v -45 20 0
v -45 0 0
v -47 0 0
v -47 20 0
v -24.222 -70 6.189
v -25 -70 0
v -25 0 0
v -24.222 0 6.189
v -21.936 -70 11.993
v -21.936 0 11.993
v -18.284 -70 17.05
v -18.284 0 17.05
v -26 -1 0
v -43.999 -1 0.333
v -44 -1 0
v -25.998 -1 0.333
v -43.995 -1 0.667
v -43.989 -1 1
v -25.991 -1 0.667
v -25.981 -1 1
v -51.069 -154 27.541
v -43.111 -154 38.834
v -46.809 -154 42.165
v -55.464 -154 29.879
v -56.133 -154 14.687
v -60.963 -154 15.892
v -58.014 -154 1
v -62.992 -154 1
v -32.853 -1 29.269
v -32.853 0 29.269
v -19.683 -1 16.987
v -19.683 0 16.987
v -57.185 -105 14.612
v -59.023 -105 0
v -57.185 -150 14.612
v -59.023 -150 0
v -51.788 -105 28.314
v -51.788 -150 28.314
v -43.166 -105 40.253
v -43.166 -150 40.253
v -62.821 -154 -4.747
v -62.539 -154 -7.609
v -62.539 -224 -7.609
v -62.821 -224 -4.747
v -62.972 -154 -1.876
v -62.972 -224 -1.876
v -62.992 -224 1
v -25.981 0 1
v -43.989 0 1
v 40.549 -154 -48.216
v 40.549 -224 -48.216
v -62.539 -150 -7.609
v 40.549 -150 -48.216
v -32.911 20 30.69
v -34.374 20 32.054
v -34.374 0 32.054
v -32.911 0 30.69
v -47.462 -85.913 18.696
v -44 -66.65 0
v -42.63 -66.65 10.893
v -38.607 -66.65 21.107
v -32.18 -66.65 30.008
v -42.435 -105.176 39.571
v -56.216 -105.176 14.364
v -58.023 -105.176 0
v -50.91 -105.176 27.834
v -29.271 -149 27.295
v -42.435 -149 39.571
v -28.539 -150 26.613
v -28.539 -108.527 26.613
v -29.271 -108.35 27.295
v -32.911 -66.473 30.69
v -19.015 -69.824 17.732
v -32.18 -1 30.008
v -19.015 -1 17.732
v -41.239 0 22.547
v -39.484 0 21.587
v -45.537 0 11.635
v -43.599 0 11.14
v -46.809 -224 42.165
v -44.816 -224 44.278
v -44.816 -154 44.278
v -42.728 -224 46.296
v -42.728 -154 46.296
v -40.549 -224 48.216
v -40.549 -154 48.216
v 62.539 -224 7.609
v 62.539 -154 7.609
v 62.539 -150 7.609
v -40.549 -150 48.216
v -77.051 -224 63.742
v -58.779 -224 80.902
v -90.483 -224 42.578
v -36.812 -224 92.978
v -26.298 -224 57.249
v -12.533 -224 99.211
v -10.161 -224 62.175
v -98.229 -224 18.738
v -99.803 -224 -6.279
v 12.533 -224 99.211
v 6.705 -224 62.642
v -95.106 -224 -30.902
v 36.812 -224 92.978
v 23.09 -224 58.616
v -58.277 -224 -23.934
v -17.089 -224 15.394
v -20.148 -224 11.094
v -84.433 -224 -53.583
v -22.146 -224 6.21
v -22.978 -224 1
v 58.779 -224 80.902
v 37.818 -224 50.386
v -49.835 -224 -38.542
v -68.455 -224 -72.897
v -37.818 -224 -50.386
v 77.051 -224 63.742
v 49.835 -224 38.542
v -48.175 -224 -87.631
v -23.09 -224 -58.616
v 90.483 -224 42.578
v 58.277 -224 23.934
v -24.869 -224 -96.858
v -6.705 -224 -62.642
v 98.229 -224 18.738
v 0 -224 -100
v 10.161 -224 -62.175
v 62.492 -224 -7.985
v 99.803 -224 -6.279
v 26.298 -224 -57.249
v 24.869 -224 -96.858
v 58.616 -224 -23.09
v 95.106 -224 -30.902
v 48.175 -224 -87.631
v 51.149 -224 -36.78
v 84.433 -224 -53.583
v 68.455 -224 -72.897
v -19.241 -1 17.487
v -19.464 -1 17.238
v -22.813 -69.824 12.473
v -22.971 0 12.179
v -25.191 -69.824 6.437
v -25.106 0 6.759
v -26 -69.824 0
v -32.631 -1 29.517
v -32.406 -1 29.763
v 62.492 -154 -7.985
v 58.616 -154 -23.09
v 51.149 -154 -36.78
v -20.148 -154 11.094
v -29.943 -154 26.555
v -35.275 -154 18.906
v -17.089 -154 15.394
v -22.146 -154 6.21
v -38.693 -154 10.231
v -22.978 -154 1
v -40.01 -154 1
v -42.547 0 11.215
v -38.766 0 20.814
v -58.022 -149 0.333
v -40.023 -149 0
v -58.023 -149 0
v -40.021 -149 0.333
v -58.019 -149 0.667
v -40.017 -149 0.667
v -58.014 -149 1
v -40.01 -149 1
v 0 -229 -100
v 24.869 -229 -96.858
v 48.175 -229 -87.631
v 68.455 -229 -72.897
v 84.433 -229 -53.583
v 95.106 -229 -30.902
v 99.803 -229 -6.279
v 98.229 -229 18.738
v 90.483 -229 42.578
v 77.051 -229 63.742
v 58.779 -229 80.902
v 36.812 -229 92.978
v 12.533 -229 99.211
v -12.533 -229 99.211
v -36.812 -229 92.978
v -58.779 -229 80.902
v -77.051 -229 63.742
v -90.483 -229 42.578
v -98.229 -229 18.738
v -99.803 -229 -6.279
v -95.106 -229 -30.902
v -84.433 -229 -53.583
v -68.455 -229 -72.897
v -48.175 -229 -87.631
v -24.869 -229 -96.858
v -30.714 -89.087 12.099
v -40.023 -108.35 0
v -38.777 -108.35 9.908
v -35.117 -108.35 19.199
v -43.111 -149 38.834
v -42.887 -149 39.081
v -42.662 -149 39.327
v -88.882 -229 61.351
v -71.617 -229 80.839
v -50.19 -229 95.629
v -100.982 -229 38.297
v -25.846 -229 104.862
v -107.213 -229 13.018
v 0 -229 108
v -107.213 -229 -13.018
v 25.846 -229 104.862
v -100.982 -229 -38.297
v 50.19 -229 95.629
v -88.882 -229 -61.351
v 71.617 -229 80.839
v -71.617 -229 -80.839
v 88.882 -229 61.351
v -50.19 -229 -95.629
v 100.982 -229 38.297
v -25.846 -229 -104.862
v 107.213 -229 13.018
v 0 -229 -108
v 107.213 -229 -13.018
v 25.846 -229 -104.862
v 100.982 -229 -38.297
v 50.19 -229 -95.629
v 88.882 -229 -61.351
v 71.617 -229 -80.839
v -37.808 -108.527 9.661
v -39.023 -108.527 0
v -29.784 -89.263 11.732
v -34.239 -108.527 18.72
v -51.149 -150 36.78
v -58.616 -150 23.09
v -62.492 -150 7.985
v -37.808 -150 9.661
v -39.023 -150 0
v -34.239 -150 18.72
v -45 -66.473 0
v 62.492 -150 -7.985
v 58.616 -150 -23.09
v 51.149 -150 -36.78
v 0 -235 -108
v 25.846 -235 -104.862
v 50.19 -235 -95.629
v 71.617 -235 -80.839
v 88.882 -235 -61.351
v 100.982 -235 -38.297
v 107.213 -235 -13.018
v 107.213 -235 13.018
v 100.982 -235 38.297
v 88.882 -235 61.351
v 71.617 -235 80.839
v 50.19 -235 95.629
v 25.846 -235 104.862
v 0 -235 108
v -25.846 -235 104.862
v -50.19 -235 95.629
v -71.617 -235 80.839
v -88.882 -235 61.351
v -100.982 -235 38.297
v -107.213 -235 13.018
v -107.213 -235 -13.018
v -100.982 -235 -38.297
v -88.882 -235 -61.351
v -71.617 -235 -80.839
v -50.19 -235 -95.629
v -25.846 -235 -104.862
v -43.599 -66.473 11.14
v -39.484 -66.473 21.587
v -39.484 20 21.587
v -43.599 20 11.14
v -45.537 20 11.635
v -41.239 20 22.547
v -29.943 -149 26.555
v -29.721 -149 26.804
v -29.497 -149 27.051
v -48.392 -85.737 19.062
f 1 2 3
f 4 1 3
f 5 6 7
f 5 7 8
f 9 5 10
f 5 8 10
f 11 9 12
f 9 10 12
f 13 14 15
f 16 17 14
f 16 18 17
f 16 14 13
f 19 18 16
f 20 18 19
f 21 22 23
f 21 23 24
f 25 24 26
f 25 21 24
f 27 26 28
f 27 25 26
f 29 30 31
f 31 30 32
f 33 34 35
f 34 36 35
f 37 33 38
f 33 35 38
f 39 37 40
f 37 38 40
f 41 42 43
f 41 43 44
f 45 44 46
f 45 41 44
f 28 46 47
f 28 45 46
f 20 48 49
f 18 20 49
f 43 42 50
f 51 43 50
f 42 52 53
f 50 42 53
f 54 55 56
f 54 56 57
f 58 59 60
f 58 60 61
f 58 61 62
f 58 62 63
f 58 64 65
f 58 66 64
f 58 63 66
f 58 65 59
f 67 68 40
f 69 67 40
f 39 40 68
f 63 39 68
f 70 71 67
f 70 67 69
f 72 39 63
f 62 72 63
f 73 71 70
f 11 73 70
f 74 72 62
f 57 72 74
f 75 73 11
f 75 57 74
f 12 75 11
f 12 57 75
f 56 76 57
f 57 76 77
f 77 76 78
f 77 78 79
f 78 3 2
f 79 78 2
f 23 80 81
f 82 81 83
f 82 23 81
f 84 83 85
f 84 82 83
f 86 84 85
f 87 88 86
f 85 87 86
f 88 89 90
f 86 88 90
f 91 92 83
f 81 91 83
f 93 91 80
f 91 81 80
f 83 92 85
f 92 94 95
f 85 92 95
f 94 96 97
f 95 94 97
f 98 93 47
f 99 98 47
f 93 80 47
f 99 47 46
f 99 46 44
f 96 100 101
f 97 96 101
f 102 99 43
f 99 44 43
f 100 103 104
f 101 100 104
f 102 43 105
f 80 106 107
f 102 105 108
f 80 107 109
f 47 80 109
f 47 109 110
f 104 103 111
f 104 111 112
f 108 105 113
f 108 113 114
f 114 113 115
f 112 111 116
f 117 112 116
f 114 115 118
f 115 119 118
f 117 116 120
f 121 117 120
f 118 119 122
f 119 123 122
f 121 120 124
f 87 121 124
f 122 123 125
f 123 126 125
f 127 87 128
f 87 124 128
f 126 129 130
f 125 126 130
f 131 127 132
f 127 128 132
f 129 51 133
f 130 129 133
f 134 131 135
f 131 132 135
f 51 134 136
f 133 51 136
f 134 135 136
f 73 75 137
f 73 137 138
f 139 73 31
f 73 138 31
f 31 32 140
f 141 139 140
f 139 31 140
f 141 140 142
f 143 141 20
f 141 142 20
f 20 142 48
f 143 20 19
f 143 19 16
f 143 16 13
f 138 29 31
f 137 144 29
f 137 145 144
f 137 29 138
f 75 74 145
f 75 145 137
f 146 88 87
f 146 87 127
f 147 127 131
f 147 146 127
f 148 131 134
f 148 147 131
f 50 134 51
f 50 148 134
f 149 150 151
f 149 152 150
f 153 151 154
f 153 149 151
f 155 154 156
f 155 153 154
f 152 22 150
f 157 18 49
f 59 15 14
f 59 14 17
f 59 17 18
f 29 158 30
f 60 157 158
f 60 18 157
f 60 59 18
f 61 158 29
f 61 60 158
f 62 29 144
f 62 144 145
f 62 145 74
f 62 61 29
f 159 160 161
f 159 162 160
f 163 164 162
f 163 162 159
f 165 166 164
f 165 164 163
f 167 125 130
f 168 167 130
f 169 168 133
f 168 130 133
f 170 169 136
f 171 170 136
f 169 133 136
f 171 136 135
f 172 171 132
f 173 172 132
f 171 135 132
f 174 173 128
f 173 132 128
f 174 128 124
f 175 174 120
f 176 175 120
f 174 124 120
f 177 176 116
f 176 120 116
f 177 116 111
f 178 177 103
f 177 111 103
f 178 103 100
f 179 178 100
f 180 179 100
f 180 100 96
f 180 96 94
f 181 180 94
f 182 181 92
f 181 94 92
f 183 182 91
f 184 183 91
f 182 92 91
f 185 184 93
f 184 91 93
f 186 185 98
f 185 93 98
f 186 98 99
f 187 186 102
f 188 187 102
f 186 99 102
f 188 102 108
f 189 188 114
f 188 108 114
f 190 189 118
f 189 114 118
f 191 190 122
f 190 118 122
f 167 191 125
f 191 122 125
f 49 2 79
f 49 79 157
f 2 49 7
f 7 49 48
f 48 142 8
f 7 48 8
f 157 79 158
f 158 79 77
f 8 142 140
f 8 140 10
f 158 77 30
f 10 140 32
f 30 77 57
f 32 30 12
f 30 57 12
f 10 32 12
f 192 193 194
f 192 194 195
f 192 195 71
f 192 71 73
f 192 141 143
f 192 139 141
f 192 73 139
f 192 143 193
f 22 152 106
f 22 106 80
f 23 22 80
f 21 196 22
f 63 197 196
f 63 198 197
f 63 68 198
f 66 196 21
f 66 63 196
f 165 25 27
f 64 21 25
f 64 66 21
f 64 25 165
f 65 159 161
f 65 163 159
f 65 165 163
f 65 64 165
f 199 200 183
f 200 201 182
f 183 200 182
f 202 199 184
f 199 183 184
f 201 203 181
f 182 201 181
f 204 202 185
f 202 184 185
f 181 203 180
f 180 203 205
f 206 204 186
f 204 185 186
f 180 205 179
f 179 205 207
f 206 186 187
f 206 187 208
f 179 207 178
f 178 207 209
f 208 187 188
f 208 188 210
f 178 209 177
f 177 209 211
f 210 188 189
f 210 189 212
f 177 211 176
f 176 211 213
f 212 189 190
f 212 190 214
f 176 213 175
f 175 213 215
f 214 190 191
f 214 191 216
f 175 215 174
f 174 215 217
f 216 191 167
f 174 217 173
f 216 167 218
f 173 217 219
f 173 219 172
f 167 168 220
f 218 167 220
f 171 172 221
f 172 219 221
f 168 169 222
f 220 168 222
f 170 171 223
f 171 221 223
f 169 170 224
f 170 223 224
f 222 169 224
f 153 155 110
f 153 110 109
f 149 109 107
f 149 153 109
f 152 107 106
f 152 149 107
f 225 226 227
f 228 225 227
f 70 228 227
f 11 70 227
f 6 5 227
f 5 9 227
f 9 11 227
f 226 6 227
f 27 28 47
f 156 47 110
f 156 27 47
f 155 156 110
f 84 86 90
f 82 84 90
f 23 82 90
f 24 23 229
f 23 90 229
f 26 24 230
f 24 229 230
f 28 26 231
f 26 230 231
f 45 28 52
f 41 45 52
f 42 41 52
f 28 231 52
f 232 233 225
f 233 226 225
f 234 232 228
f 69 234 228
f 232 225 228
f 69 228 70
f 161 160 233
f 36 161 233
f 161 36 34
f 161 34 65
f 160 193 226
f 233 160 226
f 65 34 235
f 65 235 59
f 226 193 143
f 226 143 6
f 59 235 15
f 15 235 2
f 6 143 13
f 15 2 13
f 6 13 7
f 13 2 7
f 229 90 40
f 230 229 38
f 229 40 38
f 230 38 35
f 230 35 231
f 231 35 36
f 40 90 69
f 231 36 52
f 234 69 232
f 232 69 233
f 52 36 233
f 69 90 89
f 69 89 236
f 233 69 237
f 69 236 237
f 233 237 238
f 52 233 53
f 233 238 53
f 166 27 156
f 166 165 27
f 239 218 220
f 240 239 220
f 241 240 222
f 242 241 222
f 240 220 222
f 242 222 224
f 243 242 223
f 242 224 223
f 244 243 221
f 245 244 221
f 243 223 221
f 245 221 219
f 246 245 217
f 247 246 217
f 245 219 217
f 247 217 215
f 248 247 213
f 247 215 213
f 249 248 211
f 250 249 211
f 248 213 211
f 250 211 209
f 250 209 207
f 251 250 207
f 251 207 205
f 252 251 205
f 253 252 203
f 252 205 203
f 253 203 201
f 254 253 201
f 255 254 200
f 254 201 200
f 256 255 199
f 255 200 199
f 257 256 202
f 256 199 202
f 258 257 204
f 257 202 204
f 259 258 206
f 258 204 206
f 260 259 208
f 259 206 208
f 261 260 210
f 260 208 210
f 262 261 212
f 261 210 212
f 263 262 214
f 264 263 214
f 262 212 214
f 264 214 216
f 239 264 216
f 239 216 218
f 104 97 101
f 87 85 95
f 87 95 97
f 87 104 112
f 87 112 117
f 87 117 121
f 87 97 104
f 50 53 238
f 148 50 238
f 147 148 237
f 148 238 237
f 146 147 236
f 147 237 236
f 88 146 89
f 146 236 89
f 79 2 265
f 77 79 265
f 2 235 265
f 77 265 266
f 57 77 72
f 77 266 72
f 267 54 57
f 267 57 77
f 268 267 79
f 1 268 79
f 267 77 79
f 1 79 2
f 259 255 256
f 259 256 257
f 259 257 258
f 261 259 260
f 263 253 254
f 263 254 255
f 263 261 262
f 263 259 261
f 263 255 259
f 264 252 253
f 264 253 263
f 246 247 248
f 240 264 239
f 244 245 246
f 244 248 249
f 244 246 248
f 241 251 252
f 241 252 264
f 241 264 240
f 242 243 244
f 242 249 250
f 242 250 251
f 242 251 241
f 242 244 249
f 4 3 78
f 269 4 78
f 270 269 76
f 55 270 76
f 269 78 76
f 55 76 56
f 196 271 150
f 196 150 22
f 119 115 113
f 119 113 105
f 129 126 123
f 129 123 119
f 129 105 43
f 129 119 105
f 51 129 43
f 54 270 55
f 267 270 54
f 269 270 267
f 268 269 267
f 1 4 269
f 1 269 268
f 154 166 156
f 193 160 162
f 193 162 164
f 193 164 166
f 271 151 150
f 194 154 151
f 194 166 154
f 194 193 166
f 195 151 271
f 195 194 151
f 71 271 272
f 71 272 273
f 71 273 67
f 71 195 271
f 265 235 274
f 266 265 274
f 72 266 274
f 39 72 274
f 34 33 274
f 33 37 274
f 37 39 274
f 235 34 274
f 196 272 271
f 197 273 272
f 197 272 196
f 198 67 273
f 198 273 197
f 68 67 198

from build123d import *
from build123d.topology import SkipClean

# Parameters (mm, degrees)
REVOLVE2_ANGLE      = 43
CUT_EXTRUDE3_DEPTH  = 3
CUT_EXTRUDE4_DEPTH  = 7
BOSS_EXTRUDE1_DEPTH = 20
SKETCH6_R           = 63
BOSS_EXTRUDE2_DEPTH = 4
CUT_EXTRUDE5_DEPTH  = 4
BOSS_EXTRUDE3_DEPTH = 70
SKETCH10_R          = 100
BOSS_EXTRUDE4_DEPTH = 5
SKETCH11_R          = 108
BOSS_EXTRUDE6_DEPTH = 6
CUT_EXTRUDE6_DEPTH  = 74


with BuildPart() as part:
    # Sketch1 → Revolve2 (revolve)
    with BuildSketch(Plane.XY):
        Polygon((-25, 0), (-45, 0), (-45, -66.473460386), (-59.022513649, -105), (-59.022513649, -150), (-39.022513649, -150), (-39.022513649, -108.526539614), (-25, -70), align=None)
        Polygon((-44, -1), (-44, -66.649787367), (-58.022513649, -105.176326981), (-58.022513649, -149), (-40.022513649, -149), (-40.022513649, -108.350212633), (-26, -69.823673019), (-26, -1), align=None, mode=Mode.SUBTRACT)
    revolve(axis=Axis((0, 0, 0), (0, 1, 0)), revolution_arc=REVOLVE2_ANGLE)

    # 3DSketch2 → Cut-Extrude3 (cut)
    with BuildSketch(Plane(origin=(-25.980762114, 0, 1), x_dir=(-0.23623107763582377, 0, 0.9716969064265963), z_dir=(0, 1, 0))):
        with BuildLine():
            Line((0, 0), (4.254019193, -17.498194274))
            ThreePointArc((4.254019193, -17.498194274), (18.231392391, -10.961020186), (29.092223071, 0))
            Line((29.092223071, 0), (14.047290588, 9.89613504))
            ThreePointArc((14.047290588, 9.89613504), (7.864802638, 3.754067883), (0, 0))
        make_face()
    extrude(amount=-CUT_EXTRUDE3_DEPTH, mode=Mode.SUBTRACT)

    # 3DSketch3 → Cut-Extrude4 (cut)
    with BuildSketch(Plane(origin=(-58.013895664, -150, 1), x_dir=(0.9998514717105971, 0, -0.017234689383714308), z_dir=(0, -1, 0))):
        with BuildLine():
            Line((0, 0), (18.001202849, 0.310291227))
            ThreePointArc((18.001202849, 0.310291227), (20.537591079, 14.024342363), (27.625813139, 26.035402761))
            Line((27.625813139, 26.035402761), (14.248948694, 38.085260946))
            ThreePointArc((14.248948694, 38.085260946), (3.678864709, 20.33174636), (0, 0))
        make_face()
    extrude(amount=-CUT_EXTRUDE4_DEPTH, mode=Mode.SUBTRACT)

    # Sketch6 → Boss-Extrude2 (add)
    with BuildSketch(Plane.XZ.offset(150)):
        with Locations(Location((0, 0, 0), (0, 0, 270))):
            Circle(SKETCH6_R)
    extrude(amount=BOSS_EXTRUDE2_DEPTH)

    # 3DSketch3<2> → Cut-Extrude5 (cut)
    with BuildSketch(Plane(origin=(-58.013895664, -150, 1), x_dir=(0.9998514717105971, 0, -0.017234689383714308), z_dir=(0, -1, 0))):
        with BuildLine():
            Line((0, 0), (18.001202849, 0.310291227))
            ThreePointArc((18.001202849, 0.310291227), (20.537591079, 14.024342363), (27.625813139, 26.035402761))
            Line((27.625813139, 26.035402761), (14.248948694, 38.085260946))
            ThreePointArc((14.248948694, 38.085260946), (3.678864709, 20.33174636), (0, 0))
        make_face()
    extrude(amount=CUT_EXTRUDE5_DEPTH, mode=Mode.SUBTRACT)

    # Sketch7 → Boss-Extrude3 (add)
    with SkipClean():  # the faces are left unmerged after this step: merging them gives an invalid solid
        with BuildSketch(Plane(origin=(0, -154, 0), x_dir=(-1, 0, 0), z_dir=(0, -1, 0))):
            with BuildLine():
                Line((17.08897941, -15.393725433), (46.808943602, -42.165421839))
                ThreePointArc((46.808943602, -42.165421839), (-58.632015581, 23.049658325), (62.992062992, -1))
                Line((62.992062992, -1), (22.978250586, -1))
                ThreePointArc((22.978250586, -1), (21.287098507, -8.709732323), (17.08897941, -15.393725433))
            make_face()
        extrude(amount=BOSS_EXTRUDE3_DEPTH)

    # Sketch10 → Boss-Extrude4 (add)
    with SkipClean():  # the faces are left unmerged after this step: merging them gives an invalid solid
        with BuildSketch(Plane(origin=(0, -224, 0), x_dir=(-1, 0, 0), z_dir=(0, -1, 0))):
            with Locations(Location((0, 0, 0), (0, 0, 90))):
                Circle(SKETCH10_R)
        extrude(amount=BOSS_EXTRUDE4_DEPTH)

    # Sketch11 → Boss-Extrude6 (add)
    with SkipClean():  # the faces are left unmerged after this step: merging them gives an invalid solid
        with BuildSketch(Plane(origin=(0, -229, 0), x_dir=(-1, 0, 0), z_dir=(0, -1, 0))):
            with Locations(Location((0, 0, 0), (0, 0, 90))):
                Circle(SKETCH11_R)
        extrude(amount=BOSS_EXTRUDE6_DEPTH)

    # Sketch14 → Cut-Extrude6 (cut)
    with SkipClean():  # the faces are left unmerged after this step: merging them gives an invalid solid
        with BuildSketch(Plane(origin=(0, -150, 0), x_dir=(1, 0, 0), z_dir=(0, 1, 0))):
            with BuildLine():
                ThreePointArc((40.548752884, 48.216165749), (-23.089577284, 58.616306783), (-62.538826487, 7.608888329))
                Line((-62.538826487, 7.608888329), (40.548752884, 48.216165749))
            make_face()
            with BuildLine():
                Line((62.538826487, -7.608888329), (-40.548752884, -48.216165749))
                ThreePointArc((-40.548752884, -48.216165749), (23.089577284, -58.616306783), (62.538826487, -7.608888329))
            make_face()
        extrude(amount=-CUT_EXTRUDE6_DEPTH, mode=Mode.SUBTRACT)


with BuildPart() as body_2:
    # Sketch5 → Boss-Extrude1 (new body)
    with BuildSketch(Plane(origin=(0, 0, 0), x_dir=(1, 0, 0), z_dir=(0, 1, 0))):
        with BuildLine():
            Line((-45, 0), (-47, 0))
            ThreePointArc((-47, 0), (-43.729625695, -17.225557656), (-34.373623976, -32.053922923))
            Line((-34.373623976, -32.053922923), (-32.910916573, -30.689926203))
            ThreePointArc((-32.910916573, -30.689926203), (-41.868790559, -16.492555203), (-45, 0))
        make_face()
    extrude(amount=BOSS_EXTRUDE1_DEPTH)


solid = Compound([part.part, body_2.part])
